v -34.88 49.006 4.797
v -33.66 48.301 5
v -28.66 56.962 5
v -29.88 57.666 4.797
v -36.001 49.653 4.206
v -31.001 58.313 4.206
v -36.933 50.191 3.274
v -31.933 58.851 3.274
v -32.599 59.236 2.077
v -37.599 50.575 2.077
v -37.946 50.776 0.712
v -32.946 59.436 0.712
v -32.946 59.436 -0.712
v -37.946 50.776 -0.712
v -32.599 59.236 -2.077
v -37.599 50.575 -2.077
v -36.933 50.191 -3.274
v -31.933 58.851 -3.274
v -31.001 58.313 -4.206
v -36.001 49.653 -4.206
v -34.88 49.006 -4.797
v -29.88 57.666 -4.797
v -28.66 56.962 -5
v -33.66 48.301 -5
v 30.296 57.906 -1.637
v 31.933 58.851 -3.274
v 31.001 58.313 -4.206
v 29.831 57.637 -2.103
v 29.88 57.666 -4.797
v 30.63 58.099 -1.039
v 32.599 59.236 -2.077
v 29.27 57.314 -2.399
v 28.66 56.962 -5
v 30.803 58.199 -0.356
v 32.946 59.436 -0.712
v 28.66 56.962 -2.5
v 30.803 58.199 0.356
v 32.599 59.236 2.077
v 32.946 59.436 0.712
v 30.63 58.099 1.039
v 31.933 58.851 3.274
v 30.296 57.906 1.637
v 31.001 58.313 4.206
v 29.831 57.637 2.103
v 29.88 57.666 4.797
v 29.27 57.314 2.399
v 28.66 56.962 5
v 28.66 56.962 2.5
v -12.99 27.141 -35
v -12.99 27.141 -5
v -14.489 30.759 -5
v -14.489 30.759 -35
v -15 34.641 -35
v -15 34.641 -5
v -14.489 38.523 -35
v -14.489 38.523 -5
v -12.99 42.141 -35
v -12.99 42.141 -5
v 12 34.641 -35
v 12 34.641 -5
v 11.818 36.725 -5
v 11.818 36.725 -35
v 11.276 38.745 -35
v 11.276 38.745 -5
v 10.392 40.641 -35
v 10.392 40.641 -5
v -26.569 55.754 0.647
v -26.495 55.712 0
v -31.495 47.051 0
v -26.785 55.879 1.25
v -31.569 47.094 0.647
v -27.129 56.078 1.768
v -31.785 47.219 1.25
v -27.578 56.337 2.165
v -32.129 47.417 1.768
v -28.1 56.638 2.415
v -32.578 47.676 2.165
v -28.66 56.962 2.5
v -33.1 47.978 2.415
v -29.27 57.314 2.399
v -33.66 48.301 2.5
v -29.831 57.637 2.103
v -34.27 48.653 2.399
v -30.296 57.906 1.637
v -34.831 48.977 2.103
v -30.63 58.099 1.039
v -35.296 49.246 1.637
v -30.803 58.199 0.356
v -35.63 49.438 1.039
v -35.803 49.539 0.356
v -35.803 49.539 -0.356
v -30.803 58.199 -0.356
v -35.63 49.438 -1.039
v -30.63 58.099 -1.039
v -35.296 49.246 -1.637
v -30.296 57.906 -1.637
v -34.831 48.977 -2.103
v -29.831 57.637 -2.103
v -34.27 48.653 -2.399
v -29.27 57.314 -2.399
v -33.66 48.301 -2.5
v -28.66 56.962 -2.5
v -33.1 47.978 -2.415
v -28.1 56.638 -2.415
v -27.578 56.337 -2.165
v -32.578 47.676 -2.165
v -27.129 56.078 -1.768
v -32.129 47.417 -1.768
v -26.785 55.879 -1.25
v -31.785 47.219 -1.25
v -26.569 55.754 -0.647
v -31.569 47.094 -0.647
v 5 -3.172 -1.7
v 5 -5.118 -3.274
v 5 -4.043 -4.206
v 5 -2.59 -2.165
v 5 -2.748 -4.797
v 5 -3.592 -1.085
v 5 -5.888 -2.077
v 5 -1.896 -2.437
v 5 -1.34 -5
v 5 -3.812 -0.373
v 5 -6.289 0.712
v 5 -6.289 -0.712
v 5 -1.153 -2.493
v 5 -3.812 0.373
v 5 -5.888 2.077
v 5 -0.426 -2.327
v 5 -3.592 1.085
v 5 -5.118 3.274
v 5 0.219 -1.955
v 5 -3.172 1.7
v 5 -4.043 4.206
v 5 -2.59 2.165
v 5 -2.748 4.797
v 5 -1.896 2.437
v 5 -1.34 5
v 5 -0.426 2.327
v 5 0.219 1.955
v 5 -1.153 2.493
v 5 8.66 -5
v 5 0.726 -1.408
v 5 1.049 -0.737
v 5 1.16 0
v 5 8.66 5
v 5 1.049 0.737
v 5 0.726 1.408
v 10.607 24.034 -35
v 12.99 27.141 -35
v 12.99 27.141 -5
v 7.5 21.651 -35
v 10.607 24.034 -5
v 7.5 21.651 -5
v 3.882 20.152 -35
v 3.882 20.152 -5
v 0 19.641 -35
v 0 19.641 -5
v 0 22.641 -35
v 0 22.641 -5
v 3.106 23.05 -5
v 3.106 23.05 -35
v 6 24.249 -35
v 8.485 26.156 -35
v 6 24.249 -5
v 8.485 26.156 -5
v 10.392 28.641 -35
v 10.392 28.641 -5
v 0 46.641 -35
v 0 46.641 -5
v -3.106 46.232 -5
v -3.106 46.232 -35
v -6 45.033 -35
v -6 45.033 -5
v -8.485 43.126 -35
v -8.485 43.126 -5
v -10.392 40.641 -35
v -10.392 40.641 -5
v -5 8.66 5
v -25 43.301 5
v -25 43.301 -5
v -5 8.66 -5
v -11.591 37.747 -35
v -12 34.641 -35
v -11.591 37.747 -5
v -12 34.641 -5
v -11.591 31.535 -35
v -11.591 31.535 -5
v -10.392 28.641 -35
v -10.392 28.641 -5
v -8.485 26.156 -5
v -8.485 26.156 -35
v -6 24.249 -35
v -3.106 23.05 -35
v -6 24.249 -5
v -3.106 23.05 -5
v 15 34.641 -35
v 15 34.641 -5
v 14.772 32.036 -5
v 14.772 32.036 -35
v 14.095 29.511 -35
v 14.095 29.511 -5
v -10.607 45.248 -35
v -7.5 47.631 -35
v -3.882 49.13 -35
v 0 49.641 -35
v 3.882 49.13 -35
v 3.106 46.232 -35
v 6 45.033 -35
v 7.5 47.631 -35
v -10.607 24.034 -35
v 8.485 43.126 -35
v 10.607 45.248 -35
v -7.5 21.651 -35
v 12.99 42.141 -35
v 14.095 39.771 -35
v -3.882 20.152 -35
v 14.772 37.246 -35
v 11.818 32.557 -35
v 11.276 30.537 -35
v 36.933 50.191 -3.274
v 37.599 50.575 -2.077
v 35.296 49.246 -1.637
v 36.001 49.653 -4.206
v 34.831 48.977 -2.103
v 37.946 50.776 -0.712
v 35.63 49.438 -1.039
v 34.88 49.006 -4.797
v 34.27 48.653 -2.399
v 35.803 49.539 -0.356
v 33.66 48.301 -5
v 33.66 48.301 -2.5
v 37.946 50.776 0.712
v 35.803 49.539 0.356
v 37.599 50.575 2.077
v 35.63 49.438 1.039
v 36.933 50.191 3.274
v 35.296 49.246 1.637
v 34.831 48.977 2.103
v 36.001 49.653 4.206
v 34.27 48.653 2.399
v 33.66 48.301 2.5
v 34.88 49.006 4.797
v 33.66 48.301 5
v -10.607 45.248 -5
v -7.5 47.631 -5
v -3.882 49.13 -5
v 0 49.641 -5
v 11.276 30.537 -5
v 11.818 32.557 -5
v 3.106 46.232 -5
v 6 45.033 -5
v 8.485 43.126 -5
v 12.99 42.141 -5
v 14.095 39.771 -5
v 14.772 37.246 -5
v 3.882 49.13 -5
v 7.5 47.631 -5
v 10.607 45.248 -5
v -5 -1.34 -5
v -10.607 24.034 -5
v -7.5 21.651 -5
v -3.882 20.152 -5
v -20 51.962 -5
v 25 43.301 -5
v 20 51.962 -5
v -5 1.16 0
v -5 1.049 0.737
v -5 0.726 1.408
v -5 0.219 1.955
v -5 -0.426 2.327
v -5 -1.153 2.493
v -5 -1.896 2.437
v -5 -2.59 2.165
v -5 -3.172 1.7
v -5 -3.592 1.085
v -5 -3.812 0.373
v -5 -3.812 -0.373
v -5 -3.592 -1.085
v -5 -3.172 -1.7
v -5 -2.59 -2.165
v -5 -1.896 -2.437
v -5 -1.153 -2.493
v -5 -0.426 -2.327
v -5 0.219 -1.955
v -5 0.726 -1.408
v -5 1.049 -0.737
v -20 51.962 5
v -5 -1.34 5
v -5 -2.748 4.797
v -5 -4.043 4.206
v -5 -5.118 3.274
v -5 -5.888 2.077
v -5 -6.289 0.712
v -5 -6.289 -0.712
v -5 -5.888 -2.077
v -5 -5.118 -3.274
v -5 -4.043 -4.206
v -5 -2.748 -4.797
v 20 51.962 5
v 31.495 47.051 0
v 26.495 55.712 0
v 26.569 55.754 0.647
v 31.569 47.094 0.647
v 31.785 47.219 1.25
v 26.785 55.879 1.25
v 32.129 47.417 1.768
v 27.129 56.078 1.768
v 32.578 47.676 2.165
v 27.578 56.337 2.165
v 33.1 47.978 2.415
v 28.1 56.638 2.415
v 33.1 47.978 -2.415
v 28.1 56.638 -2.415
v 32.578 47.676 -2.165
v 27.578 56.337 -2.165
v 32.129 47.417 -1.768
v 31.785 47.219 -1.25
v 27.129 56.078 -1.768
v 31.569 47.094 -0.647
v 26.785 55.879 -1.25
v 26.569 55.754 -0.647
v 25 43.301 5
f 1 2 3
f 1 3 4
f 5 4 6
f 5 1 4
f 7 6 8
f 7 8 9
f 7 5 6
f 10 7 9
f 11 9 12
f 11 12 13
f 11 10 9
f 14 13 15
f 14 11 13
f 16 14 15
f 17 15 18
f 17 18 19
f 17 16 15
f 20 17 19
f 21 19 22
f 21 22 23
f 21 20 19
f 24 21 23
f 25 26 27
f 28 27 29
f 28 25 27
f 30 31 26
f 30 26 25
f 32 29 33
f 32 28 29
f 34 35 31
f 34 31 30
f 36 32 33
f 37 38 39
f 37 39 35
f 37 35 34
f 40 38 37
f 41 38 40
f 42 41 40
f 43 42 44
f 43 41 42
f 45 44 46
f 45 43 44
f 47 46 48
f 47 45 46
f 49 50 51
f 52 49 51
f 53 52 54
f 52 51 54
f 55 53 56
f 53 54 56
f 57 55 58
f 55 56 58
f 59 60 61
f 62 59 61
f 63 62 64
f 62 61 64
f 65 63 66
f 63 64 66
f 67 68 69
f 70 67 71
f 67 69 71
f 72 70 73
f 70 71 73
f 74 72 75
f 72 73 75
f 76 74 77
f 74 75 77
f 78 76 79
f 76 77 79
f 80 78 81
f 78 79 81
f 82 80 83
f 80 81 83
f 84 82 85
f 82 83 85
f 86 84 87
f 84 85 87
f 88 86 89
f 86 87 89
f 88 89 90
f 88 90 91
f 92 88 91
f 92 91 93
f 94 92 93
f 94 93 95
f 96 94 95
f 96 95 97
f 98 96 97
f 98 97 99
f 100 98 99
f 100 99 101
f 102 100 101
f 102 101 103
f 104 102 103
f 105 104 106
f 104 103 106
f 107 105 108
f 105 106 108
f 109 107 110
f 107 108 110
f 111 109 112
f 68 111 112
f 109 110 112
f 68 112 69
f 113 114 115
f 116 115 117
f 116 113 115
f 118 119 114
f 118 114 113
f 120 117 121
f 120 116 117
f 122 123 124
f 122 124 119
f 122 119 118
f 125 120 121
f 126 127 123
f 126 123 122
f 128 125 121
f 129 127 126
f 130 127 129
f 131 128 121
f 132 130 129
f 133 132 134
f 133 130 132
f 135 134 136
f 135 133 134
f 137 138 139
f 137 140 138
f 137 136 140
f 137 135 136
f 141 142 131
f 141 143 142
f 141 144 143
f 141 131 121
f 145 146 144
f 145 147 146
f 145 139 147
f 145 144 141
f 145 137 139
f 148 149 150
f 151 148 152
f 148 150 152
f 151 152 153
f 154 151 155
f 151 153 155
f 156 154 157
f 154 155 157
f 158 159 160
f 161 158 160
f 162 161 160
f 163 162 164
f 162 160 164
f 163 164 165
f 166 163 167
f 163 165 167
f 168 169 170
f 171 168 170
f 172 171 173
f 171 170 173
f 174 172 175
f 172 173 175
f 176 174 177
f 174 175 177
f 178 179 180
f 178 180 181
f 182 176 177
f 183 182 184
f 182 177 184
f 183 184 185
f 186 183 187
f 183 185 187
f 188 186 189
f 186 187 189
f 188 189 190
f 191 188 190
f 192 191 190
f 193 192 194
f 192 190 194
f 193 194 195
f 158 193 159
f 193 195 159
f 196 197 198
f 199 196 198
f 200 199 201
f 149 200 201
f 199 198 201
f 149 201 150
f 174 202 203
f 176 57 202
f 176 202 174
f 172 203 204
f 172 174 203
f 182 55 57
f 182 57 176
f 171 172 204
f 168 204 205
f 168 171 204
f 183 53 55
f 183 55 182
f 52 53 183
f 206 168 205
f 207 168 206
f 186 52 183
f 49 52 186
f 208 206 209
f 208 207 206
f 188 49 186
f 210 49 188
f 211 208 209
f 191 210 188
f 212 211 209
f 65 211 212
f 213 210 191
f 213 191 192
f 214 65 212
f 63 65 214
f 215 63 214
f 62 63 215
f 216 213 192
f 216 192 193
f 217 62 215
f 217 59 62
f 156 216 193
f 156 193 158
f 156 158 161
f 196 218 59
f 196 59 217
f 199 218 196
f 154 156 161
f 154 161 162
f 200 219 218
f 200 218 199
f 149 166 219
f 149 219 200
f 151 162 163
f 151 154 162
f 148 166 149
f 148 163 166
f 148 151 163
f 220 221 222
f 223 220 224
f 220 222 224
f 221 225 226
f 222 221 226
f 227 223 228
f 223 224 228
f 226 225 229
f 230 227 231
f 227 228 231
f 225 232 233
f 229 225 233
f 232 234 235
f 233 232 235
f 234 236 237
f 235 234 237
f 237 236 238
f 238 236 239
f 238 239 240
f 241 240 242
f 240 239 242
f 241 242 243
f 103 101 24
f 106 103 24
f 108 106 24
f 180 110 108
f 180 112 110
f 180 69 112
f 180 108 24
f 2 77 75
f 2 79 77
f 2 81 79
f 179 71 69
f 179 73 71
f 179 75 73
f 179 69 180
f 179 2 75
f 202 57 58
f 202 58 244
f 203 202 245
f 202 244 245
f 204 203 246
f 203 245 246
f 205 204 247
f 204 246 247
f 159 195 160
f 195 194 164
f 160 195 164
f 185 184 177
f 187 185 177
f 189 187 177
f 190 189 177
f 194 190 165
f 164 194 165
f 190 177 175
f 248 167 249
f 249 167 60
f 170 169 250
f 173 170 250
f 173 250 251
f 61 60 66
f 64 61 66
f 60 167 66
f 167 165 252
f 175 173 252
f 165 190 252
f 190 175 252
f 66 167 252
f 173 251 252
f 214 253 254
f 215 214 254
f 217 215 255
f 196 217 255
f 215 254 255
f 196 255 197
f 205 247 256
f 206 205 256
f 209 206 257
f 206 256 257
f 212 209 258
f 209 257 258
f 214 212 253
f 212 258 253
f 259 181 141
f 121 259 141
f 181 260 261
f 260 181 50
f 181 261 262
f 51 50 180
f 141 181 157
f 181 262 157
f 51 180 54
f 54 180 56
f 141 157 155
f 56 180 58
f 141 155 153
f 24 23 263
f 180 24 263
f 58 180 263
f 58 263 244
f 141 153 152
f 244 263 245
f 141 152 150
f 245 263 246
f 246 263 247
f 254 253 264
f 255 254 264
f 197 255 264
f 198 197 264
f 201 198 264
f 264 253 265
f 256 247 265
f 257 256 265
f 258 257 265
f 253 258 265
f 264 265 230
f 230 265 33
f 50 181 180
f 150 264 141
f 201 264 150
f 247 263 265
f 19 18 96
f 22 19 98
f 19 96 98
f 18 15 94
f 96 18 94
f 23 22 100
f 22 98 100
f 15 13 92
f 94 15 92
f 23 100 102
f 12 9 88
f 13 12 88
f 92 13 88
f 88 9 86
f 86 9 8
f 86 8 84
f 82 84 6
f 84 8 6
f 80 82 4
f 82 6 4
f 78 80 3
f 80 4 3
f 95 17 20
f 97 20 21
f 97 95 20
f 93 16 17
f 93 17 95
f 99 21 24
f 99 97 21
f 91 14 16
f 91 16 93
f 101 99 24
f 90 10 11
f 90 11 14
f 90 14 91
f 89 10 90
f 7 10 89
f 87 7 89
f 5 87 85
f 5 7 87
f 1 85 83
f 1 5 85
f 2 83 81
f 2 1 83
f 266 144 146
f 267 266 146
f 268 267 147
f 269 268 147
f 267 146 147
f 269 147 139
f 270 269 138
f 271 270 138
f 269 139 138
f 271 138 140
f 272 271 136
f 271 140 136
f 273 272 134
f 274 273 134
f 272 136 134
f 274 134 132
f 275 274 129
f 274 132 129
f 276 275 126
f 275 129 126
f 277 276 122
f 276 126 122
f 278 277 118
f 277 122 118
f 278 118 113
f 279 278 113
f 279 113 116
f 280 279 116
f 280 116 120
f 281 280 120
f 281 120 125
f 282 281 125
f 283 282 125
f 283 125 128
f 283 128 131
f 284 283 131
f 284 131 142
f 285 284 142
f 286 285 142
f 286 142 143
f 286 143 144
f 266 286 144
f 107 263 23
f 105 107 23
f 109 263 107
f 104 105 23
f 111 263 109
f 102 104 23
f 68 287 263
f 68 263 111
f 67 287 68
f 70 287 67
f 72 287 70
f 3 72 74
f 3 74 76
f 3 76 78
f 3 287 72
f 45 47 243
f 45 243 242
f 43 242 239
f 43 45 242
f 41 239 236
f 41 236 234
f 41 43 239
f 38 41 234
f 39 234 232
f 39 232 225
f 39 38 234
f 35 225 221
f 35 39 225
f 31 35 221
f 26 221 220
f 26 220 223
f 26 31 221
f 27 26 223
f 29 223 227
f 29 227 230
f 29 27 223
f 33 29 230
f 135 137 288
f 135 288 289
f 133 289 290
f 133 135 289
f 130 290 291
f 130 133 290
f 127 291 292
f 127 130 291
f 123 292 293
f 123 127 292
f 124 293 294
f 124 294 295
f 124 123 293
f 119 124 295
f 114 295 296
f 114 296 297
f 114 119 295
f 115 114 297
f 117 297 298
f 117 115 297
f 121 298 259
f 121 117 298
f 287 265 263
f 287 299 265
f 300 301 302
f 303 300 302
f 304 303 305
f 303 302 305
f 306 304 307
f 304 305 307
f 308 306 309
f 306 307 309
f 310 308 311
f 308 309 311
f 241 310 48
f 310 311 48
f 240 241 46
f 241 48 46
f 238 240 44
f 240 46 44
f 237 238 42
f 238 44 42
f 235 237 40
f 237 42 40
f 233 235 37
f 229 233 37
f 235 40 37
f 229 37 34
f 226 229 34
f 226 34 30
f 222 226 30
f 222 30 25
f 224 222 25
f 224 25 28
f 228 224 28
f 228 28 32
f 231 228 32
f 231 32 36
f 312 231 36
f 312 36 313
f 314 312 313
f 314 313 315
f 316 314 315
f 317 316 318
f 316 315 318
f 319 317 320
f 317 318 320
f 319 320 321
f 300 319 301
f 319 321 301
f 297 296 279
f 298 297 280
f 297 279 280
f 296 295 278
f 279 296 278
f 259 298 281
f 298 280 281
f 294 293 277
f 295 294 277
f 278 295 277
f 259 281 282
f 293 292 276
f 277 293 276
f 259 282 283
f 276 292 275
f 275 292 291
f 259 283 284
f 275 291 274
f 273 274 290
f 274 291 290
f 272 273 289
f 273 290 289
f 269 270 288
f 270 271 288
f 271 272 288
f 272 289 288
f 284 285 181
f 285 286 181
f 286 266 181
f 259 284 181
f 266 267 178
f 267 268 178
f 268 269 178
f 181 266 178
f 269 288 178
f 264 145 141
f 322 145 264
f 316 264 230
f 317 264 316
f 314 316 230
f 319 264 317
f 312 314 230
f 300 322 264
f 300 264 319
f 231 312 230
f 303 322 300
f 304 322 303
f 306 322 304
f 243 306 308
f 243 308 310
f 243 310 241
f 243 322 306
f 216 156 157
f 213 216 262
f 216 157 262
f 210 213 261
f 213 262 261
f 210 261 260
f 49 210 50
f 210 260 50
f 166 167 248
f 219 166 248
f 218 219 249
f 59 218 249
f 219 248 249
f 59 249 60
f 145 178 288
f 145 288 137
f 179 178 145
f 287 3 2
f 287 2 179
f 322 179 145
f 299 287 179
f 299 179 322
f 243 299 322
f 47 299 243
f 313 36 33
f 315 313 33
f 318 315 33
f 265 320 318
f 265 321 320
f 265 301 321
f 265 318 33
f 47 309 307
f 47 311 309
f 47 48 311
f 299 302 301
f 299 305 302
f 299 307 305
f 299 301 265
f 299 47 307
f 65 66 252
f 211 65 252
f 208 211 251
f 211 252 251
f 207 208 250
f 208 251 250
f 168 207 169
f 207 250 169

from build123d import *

# Parameters (mm, degrees)
F1_DEPTH  = 5
F3_DEPTH  = 10
F5_DEPTH  = 10
F7_DEPTH  = 10
F8_R      = 2.5
F9_DEPTH  = 25.4
F10_R     = 2.5
F11_DEPTH = 25.4
F12_R     = 2.5
F13_DEPTH = 25.4
F15_DEPTH = 30


with BuildPart() as f1:
    # F0 (on Top) → F1 (new body, symmetric)
    with BuildSketch(Plane.XY):
        Polygon((-25, 43.3012701892), (-30, 51.9615242271), (-20, 51.9615242271), (-28.6602540378, 56.9615242271), (-33.6602540378, 48.3012701892), align=None)
        Polygon((-20, 51.9615242271), (-30, 51.9615242271), (-25, 43.3012701892), align=None)
        Polygon((20, 51.9615242271), (-20, 51.9615242271), (-25, 43.3012701892), (-5, 8.6602540378), (5, 8.6602540378), (25, 43.3012701892), align=None)
        Polygon((28.6602540378, 56.9615242271), (20, 51.9615242271), (30, 51.9615242271), (25, 43.3012701892), (33.6602540378, 48.3012701892), align=None)
        Polygon((30, 51.9615242271), (20, 51.9615242271), (25, 43.3012701892), align=None)
        Polygon((5, 8.6602540378), (-5, 8.6602540378), (0, 0), align=None)
        Polygon((0, 0), (-5, 8.6602540378), (-5, -1.3397459622), (5, -1.3397459622), (5, 8.6602540378), align=None)
    extrude(amount=F1_DEPTH, both=True)

    # F2 (on face) → F3 (join)
    with BuildSketch(Plane(origin=(12.5, 21.6506350946, 0), x_dir=(0.8660254038, -0.5, 0), z_dir=(-0.5, -0.8660254038, 0))):
        with BuildLine():
            Line((-53.3012701892, -5), (-53.3012701892, 5))
            ThreePointArc((-53.3012701892, 5), (-58.3012701892, 0), (-53.3012701892, -5))
        make_face()
    extrude(amount=-F3_DEPTH)

    # F4 (on face) → F5 (join)
    with BuildSketch(Plane(origin=(-17.5, 30.3108891325, 0), x_dir=(-0.8660254038, -0.5, 0), z_dir=(-0.5, 0.8660254038, 0))):
        with BuildLine():
            Line((-53.3012701892, -5), (-53.3012701892, 5))
            ThreePointArc((-53.3012701892, 5), (-58.3012701892, 0), (-53.3012701892, -5))
        make_face()
    extrude(amount=-F5_DEPTH)

    # F6 (on face) → F7 (join)
    with BuildSketch(Plane.YZ.offset(5)):
        with BuildLine():
            Line((-1.3397459622, -5), (-1.3397459622, 5))
            ThreePointArc((-1.3397459622, 5), (-6.3397459622, 0), (-1.3397459622, -5))
        make_face()
    extrude(amount=-F7_DEPTH)

    # F8 (on face) → F9 (cut)
    with BuildSketch(Plane.YZ.offset(5)):
        with Locations((-1.3397459622, 0)):
            Circle(F8_R)
    extrude(amount=-F9_DEPTH, mode=Mode.SUBTRACT)

    # F10 (on face) → F11 (cut)
    with BuildSketch(Plane(origin=(-17.5, 30.3108891325, 0), x_dir=(-0.8660254038, -0.5, 0), z_dir=(-0.5, 0.8660254038, 0))):
        with Locations((-53.3012701892, 0)):
            Circle(F10_R)
    extrude(amount=-F11_DEPTH, mode=Mode.SUBTRACT)

    # F12 (on face) → F13 (cut)
    with BuildSketch(Plane(origin=(12.5, 21.6506350946, 0), x_dir=(0.8660254038, -0.5, 0), z_dir=(-0.5, -0.8660254038, 0))):
        with Locations((-53.3012701892, 0)):
            Circle(F12_R)
    extrude(amount=-F13_DEPTH, mode=Mode.SUBTRACT)

    # F14 (on face) → F15 (join)
    with BuildSketch(Plane(origin=(0, 0, -5), x_dir=(1, 0, 0), z_dir=(0, 0, -1))):
        with BuildLine():
            ThreePointArc((-12.9903810568, -42.1410161514), (-7.5, -47.6313972081), (0, -49.6410161514))
            Line((0, -49.6410161514), (0, -46.6410161514))
            ThreePointArc((0, -46.6410161514), (-6, -45.0333209968), (-10.3923048454, -40.6410161514))
            Line((-10.3923048454, -40.6410161514), (-12.9903810568, -42.1410161514))
        make_face()
        with BuildLine():
            Line((0, -46.6410161514), (0, -49.6410161514))
            ThreePointArc((0, -49.6410161514), (7.5, -47.6313972081), (12.9903810568, -42.1410161514))
            Line((12.9903810568, -42.1410161514), (10.3923048454, -40.6410161514))
            ThreePointArc((10.3923048454, -40.6410161514), (6, -45.0333209968), (0, -46.6410161514))
        make_face()
        with BuildLine():
            ThreePointArc((-12.9903810568, -27.1410161514), (-15, -34.6410161514), (-12.9903810568, -42.1410161514))
            Line((-12.9903810568, -42.1410161514), (-10.3923048454, -40.6410161514))
            ThreePointArc((-10.3923048454, -40.6410161514), (-12, -34.6410161514), (-10.3923048454, -28.6410161514))
            Line((-10.3923048454, -28.6410161514), (-12.9903810568, -27.1410161514))
        make_face()
        with BuildLine():
            Line((10.3923048454, -40.6410161514), (12.9903810568, -42.1410161514))
            ThreePointArc((12.9903810568, -42.1410161514), (14.4888873943, -38.5233018279), (15, -34.6410161514))
            ThreePointArc((15, -34.6410161514), (14.4888873943, -30.7587304748), (12.9903810568, -27.1410161514))
            Line((12.9903810568, -27.1410161514), (10.3923048454, -28.6410161514))
            ThreePointArc((10.3923048454, -28.6410161514), (11.5911099155, -31.5351876101), (12, -34.6410161514))
            ThreePointArc((12, -34.6410161514), (11.5911099155, -37.7468446926), (10.3923048454, -40.6410161514))
        make_face()
        with BuildLine():
            ThreePointArc((0, -19.6410161514), (-7.5, -21.6506350946), (-12.9903810568, -27.1410161514))
            Line((-12.9903810568, -27.1410161514), (-10.3923048454, -28.6410161514))
            ThreePointArc((-10.3923048454, -28.6410161514), (-6, -24.248711306), (0, -22.6410161514))
            Line((0, -22.6410161514), (0, -19.6410161514))
        make_face()
        with BuildLine():
            Line((0, -19.6410161514), (0, -22.6410161514))
            ThreePointArc((0, -22.6410161514), (6, -24.248711306), (10.3923048454, -28.6410161514))
            Line((10.3923048454, -28.6410161514), (12.9903810568, -27.1410161514))
            ThreePointArc((12.9903810568, -27.1410161514), (7.5, -21.6506350946), (0, -19.6410161514))
        make_face()
    extrude(amount=F15_DEPTH)


solid = f1.part
